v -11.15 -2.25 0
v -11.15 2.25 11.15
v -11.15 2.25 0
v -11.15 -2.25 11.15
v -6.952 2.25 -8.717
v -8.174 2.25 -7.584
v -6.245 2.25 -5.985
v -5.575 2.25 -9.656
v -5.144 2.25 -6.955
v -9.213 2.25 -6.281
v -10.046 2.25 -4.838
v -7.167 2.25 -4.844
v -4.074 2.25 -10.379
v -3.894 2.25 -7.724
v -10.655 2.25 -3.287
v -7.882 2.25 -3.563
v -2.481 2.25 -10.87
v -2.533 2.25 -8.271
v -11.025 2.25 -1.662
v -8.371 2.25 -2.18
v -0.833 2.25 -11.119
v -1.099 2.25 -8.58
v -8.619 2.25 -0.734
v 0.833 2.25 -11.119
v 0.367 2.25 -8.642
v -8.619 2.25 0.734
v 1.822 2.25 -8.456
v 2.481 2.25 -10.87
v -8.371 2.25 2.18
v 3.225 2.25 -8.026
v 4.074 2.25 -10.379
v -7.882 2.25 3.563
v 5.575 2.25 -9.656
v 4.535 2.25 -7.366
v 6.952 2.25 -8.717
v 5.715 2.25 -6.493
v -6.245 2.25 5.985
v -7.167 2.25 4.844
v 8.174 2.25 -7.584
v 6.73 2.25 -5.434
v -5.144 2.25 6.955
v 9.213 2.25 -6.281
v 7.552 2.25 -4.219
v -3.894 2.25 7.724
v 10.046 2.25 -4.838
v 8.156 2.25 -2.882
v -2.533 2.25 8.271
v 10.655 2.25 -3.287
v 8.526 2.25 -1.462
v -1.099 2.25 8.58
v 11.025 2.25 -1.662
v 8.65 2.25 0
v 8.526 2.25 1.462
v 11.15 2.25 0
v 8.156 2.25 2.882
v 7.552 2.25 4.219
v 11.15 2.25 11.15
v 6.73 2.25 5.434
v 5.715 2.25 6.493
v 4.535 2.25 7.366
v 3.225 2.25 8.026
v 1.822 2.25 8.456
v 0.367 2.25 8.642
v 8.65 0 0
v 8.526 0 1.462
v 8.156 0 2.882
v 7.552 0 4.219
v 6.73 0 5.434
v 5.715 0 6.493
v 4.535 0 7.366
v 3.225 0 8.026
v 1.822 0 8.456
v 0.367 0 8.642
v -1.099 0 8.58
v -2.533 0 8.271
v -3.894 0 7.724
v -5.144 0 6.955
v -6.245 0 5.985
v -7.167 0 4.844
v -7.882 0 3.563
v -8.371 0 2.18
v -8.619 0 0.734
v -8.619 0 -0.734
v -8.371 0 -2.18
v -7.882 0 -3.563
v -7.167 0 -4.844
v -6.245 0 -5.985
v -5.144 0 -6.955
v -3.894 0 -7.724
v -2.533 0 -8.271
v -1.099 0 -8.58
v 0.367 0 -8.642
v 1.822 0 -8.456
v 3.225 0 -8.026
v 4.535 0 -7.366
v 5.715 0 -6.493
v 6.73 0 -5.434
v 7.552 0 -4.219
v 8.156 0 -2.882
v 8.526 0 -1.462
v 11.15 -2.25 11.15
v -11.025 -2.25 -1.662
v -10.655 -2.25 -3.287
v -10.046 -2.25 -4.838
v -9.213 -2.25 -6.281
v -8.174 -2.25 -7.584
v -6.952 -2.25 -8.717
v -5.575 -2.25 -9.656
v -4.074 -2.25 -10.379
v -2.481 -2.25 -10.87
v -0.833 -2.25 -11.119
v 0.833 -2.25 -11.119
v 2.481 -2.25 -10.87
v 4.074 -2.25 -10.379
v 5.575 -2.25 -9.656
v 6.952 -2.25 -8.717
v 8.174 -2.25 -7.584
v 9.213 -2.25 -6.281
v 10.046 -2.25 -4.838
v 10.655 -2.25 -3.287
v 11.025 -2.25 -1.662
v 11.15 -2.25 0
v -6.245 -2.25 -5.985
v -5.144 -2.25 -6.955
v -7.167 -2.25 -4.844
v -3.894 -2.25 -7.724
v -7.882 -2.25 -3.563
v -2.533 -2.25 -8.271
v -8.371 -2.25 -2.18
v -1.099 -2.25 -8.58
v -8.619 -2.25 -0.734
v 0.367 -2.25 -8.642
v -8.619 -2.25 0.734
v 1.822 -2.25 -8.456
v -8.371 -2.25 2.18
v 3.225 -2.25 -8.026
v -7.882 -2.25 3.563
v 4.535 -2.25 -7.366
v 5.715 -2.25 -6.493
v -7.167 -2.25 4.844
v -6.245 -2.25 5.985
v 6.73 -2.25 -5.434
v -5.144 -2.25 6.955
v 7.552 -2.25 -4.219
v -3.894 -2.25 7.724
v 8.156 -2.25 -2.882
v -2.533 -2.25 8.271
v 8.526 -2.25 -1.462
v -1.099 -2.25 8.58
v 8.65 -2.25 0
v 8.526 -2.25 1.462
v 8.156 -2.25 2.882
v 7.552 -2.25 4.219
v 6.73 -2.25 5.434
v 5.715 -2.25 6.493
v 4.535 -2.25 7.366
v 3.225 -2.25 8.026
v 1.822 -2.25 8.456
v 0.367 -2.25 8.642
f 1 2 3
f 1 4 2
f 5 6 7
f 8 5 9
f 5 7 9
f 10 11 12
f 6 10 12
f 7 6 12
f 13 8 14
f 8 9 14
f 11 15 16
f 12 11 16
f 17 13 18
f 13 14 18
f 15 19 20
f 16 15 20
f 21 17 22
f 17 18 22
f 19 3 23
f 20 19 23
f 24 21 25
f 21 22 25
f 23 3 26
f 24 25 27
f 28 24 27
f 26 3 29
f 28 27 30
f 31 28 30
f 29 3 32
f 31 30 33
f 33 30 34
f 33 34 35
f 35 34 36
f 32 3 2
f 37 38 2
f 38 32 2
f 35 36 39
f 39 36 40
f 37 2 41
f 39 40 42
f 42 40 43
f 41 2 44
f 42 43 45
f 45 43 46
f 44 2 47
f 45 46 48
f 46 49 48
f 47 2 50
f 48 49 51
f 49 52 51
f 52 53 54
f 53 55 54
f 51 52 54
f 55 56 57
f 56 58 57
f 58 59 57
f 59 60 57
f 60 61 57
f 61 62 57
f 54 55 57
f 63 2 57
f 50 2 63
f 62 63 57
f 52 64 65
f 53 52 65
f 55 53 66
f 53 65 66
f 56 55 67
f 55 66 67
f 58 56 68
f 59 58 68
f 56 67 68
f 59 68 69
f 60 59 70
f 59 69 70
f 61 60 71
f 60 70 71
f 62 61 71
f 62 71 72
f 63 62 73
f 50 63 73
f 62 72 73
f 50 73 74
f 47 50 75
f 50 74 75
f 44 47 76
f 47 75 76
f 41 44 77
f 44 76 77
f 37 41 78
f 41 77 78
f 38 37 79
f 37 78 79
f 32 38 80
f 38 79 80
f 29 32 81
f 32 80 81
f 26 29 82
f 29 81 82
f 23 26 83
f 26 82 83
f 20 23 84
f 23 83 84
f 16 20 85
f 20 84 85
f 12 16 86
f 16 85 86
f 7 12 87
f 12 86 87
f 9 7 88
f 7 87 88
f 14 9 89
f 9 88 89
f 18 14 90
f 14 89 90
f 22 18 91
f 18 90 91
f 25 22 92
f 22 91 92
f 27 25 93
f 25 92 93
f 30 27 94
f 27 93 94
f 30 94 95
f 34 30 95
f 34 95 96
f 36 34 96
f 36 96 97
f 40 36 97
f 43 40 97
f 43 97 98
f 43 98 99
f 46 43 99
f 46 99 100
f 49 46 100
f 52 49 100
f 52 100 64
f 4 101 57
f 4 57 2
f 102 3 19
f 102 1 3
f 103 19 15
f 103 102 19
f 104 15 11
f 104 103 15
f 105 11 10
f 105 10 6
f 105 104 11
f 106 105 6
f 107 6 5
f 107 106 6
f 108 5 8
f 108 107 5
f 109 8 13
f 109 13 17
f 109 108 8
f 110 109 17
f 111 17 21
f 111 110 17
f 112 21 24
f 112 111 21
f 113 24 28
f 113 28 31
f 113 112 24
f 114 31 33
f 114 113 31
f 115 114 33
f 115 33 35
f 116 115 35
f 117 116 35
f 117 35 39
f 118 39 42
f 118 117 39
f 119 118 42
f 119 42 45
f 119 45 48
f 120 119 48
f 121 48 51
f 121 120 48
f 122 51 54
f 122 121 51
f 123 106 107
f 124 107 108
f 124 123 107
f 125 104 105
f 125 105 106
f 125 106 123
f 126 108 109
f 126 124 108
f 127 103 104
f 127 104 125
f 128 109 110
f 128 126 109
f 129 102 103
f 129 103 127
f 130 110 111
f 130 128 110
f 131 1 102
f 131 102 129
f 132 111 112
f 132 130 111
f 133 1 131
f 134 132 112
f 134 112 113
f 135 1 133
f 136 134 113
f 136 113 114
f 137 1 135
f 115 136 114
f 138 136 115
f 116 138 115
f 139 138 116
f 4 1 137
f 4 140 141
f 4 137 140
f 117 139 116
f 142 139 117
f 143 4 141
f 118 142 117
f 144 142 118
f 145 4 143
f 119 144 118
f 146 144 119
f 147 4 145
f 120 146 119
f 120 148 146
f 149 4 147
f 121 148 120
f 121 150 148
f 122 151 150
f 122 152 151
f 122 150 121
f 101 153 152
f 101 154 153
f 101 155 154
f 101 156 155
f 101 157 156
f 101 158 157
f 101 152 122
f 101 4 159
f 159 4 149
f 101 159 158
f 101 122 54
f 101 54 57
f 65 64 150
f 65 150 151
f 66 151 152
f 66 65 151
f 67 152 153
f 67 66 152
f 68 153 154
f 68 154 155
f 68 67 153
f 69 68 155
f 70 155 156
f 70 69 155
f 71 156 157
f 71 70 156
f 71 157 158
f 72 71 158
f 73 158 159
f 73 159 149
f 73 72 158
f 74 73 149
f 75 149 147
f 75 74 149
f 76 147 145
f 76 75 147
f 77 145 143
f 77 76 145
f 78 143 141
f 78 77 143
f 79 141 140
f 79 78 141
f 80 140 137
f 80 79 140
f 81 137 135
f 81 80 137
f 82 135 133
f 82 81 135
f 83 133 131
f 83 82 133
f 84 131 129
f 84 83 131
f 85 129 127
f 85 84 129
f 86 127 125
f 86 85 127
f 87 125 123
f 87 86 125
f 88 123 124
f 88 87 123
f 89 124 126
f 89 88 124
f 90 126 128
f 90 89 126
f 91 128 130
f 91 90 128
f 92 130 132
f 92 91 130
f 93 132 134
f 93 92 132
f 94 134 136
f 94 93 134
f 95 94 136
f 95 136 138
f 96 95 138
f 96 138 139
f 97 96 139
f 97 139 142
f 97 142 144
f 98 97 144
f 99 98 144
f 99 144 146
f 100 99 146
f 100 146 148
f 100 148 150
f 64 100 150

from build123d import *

# Parameters (mm, degrees)
F0_R          = 8.65
F1_DEPTH      = 2.25
F1_DEPTH_BACK = 2.25


# Not quite as in the source:
# - the program builds the solid bodies; features that only make, move or delete a surface that nothing else refers to are left out


with BuildPart() as f1:
    # F0 (on Front) → F1 (new body, two sides)
    with BuildSketch(Plane.XZ) as f1_sk:
        with BuildLine():
            ThreePointArc((-11.15, 0), (0, -11.15), (11.15, 0))
            ThreePointArc((11.15, 0), (7.8842406102, 7.8842406102), (0, 11.15))
            ThreePointArc((0, 11.15), (-7.8842406102, 7.8842406102), (-11.15, 0))
        make_face()
        Circle(F0_R, mode=Mode.SUBTRACT)
        with BuildLine():
            ThreePointArc((-11.15, 0), (-7.8842406102, 7.8842406102), (0, 11.15))
            Line((0, 11.15), (-4, 11.15))
            Line((-4, 11.15), (-9.15, 11.15))
            Line((-9.15, 11.15), (-11.15, 11.15))
            Line((-11.15, 11.15), (-11.15, 0))
        make_face()
        with BuildLine():
            ThreePointArc((0, 11.15), (7.8842406102, 7.8842406102), (11.15, 0))
            Line((11.15, 0), (11.15, 11.15))
            Line((11.15, 11.15), (0, 11.15))
        make_face()
    extrude(amount=F1_DEPTH)
    extrude(f1_sk.sketch, amount=-F1_DEPTH_BACK)


solid = f1.part
